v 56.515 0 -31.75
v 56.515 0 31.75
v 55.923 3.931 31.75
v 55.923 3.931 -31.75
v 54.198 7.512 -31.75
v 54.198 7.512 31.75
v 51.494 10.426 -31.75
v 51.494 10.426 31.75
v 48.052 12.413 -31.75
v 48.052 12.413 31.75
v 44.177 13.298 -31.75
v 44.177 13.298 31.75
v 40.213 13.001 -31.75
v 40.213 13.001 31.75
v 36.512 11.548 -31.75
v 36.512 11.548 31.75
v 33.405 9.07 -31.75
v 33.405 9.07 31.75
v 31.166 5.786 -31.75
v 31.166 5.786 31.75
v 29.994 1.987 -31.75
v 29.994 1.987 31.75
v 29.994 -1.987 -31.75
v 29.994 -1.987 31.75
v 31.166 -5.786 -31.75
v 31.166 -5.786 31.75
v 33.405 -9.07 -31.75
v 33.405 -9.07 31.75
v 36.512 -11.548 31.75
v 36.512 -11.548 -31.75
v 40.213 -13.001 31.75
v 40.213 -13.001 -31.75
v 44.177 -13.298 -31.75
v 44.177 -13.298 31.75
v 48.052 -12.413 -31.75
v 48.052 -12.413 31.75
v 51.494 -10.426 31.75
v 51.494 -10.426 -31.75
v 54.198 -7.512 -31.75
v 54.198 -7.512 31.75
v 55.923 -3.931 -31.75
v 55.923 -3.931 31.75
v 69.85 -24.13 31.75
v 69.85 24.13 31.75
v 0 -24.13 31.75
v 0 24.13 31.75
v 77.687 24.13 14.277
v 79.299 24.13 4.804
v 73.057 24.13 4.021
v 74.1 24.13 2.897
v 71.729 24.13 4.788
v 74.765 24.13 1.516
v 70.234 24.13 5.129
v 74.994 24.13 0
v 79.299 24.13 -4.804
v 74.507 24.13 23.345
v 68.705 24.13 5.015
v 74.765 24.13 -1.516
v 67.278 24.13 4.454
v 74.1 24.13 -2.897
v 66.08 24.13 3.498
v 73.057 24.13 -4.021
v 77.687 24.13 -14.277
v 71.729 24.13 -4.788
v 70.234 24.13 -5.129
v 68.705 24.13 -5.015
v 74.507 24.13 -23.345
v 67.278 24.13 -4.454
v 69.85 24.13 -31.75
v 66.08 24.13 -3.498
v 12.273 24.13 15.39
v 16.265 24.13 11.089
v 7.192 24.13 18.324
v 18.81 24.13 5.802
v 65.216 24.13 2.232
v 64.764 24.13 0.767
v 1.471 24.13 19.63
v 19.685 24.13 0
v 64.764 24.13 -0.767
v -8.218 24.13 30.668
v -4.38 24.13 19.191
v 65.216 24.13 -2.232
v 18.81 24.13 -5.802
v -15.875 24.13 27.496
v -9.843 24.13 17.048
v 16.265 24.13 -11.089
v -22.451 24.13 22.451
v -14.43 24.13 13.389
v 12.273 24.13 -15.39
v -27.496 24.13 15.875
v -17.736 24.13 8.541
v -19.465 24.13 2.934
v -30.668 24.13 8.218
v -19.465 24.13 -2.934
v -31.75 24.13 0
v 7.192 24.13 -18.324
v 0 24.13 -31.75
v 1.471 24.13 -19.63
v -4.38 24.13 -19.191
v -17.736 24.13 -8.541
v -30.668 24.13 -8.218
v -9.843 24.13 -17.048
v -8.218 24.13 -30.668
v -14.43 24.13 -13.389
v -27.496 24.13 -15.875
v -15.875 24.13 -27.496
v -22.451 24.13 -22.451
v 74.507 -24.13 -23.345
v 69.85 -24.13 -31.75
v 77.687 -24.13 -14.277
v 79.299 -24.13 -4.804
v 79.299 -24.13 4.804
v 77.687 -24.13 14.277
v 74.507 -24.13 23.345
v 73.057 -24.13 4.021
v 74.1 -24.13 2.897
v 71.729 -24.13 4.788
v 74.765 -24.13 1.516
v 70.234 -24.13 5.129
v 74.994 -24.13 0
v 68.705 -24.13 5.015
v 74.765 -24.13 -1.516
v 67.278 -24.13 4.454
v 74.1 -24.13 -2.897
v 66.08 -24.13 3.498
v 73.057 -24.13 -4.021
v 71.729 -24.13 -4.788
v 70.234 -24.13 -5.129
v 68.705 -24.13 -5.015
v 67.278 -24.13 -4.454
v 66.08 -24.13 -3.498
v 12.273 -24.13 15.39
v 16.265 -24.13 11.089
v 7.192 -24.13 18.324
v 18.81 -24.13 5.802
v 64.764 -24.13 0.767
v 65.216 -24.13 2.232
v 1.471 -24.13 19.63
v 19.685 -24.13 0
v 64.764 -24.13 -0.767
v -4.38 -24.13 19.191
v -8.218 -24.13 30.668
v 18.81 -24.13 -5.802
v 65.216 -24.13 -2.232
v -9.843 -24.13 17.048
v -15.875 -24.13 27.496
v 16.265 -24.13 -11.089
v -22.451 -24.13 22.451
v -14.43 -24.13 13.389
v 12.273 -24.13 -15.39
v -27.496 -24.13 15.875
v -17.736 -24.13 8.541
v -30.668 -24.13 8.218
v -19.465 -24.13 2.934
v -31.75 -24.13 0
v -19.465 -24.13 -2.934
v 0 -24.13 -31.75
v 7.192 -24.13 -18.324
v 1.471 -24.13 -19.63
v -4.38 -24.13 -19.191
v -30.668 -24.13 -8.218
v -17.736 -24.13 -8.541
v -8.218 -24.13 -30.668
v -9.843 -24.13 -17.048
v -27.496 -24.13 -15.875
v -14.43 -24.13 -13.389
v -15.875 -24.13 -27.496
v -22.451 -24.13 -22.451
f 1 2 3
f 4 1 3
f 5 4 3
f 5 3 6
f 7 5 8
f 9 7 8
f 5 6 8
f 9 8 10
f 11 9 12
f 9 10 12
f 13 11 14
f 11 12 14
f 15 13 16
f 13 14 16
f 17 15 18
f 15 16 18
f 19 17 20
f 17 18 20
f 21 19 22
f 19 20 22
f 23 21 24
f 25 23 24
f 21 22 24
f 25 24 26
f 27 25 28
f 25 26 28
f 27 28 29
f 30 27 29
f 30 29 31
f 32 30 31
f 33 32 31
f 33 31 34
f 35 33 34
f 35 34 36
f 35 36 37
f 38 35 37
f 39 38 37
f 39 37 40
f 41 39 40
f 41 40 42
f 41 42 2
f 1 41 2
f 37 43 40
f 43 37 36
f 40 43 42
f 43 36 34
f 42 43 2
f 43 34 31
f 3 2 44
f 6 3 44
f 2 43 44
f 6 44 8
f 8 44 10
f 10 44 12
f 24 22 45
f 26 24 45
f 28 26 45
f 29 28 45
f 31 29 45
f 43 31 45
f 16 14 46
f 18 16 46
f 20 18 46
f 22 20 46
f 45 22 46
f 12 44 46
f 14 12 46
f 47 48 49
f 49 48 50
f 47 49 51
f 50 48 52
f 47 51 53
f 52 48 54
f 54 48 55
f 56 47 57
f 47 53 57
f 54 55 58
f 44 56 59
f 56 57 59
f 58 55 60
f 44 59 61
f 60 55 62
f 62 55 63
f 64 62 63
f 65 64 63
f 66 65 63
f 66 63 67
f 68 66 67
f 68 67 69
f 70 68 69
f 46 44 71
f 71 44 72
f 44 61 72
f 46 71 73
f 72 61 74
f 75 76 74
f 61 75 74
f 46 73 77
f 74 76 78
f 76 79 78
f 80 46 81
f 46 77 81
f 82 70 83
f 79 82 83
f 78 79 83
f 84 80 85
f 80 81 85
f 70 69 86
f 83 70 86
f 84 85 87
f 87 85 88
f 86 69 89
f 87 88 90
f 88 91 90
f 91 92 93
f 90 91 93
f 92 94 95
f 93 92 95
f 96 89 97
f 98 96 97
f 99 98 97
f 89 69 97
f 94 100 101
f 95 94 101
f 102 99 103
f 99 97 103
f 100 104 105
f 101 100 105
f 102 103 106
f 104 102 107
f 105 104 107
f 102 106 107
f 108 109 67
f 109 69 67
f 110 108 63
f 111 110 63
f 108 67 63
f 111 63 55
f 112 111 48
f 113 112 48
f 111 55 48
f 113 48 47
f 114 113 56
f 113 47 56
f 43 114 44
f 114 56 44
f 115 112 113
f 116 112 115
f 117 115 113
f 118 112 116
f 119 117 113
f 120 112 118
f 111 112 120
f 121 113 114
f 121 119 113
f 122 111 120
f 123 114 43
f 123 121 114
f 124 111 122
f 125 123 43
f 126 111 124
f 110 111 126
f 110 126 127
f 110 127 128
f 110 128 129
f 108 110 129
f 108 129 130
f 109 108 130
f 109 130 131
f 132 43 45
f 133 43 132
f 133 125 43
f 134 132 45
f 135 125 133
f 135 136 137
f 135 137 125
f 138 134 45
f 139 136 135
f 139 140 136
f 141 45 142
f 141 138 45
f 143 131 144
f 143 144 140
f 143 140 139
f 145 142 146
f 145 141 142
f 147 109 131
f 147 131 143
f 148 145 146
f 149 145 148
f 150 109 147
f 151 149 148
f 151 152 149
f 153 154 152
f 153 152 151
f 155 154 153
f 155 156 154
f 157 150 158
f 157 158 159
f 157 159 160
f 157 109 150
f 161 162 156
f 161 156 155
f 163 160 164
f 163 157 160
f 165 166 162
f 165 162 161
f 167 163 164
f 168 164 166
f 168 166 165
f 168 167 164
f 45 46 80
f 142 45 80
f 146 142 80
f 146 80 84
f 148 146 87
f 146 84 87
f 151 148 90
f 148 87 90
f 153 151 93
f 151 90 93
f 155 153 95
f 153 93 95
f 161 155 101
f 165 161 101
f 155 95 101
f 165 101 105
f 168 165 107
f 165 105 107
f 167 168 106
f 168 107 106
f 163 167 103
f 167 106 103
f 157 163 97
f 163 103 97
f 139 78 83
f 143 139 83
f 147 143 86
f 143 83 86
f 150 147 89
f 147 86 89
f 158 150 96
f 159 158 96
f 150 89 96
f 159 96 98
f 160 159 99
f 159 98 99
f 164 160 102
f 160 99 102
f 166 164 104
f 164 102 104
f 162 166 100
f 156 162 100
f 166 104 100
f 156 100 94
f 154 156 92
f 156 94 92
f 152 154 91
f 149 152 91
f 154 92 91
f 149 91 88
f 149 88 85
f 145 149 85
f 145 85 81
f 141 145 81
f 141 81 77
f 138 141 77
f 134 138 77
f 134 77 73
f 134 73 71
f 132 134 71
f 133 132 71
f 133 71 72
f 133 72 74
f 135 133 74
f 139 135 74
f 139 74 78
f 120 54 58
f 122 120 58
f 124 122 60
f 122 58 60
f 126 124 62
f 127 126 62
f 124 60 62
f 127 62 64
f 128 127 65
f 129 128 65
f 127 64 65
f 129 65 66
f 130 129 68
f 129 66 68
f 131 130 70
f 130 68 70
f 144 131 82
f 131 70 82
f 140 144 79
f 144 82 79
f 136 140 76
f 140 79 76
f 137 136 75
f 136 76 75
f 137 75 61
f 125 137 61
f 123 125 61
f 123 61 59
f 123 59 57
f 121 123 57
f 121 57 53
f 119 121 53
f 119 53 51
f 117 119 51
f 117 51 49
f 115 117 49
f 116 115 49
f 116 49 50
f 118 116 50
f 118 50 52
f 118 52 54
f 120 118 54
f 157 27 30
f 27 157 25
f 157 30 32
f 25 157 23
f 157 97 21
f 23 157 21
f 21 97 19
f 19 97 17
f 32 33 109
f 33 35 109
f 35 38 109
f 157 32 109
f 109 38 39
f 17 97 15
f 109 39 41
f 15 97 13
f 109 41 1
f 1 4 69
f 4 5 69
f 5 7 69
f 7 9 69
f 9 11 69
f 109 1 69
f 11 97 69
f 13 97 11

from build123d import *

# Parameters (mm, degrees)
BOSS_EXTRUDE1_DEPTH = 24.13
SKETCH2_R           = 19.685
CUT_EXTRUDE1_DEPTH  = 49.26
SKETCH3_R           = 13.335
CUT_EXTRUDE2_DEPTH  = 64.5
SKETCH4_R           = 5.1435
CUT_EXTRUDE3_DEPTH  = 49.26


with BuildPart() as part:
    # Sketch1 → Boss-Extrude1 (new body, symmetric)
    with BuildSketch(Plane(origin=(0, 0, 0), x_dir=(1, 0, 0), z_dir=(0, 1, 0))):
        with BuildLine():
            Line((0, 31.75), (69.85, 31.75))
            ThreePointArc((69.85, 31.75), (79.502, 0), (69.85, -31.75))
            Line((69.85, -31.75), (0, -31.75))
            ThreePointArc((0, -31.75), (-31.75, 0), (0, 31.75))
        make_face()
    extrude(amount=BOSS_EXTRUDE1_DEPTH, both=True)

    # Sketch2 → Cut-Extrude1 (cut, through all)
    with BuildSketch(Plane(origin=(0, 24.13, 0), x_dir=(1, 0, 0), z_dir=(0, 1, 0))):
        Circle(SKETCH2_R)
    extrude(amount=-CUT_EXTRUDE1_DEPTH, mode=Mode.SUBTRACT)

    # Sketch3 → Cut-Extrude2 (cut, through all)
    with BuildSketch(Plane.XY.offset(31.75)):
        with Locations((43.18, 0)):
            Circle(SKETCH3_R)
    extrude(amount=-CUT_EXTRUDE2_DEPTH, mode=Mode.SUBTRACT)

    # Sketch4 → Cut-Extrude3 (cut, through all)
    with BuildSketch(Plane(origin=(0, 24.13, 0), x_dir=(1, 0, 0), z_dir=(0, 1, 0))):
        with Locations((69.85, 0)):
            Circle(SKETCH4_R)
    extrude(amount=-CUT_EXTRUDE3_DEPTH, mode=Mode.SUBTRACT)


solid = part.part
